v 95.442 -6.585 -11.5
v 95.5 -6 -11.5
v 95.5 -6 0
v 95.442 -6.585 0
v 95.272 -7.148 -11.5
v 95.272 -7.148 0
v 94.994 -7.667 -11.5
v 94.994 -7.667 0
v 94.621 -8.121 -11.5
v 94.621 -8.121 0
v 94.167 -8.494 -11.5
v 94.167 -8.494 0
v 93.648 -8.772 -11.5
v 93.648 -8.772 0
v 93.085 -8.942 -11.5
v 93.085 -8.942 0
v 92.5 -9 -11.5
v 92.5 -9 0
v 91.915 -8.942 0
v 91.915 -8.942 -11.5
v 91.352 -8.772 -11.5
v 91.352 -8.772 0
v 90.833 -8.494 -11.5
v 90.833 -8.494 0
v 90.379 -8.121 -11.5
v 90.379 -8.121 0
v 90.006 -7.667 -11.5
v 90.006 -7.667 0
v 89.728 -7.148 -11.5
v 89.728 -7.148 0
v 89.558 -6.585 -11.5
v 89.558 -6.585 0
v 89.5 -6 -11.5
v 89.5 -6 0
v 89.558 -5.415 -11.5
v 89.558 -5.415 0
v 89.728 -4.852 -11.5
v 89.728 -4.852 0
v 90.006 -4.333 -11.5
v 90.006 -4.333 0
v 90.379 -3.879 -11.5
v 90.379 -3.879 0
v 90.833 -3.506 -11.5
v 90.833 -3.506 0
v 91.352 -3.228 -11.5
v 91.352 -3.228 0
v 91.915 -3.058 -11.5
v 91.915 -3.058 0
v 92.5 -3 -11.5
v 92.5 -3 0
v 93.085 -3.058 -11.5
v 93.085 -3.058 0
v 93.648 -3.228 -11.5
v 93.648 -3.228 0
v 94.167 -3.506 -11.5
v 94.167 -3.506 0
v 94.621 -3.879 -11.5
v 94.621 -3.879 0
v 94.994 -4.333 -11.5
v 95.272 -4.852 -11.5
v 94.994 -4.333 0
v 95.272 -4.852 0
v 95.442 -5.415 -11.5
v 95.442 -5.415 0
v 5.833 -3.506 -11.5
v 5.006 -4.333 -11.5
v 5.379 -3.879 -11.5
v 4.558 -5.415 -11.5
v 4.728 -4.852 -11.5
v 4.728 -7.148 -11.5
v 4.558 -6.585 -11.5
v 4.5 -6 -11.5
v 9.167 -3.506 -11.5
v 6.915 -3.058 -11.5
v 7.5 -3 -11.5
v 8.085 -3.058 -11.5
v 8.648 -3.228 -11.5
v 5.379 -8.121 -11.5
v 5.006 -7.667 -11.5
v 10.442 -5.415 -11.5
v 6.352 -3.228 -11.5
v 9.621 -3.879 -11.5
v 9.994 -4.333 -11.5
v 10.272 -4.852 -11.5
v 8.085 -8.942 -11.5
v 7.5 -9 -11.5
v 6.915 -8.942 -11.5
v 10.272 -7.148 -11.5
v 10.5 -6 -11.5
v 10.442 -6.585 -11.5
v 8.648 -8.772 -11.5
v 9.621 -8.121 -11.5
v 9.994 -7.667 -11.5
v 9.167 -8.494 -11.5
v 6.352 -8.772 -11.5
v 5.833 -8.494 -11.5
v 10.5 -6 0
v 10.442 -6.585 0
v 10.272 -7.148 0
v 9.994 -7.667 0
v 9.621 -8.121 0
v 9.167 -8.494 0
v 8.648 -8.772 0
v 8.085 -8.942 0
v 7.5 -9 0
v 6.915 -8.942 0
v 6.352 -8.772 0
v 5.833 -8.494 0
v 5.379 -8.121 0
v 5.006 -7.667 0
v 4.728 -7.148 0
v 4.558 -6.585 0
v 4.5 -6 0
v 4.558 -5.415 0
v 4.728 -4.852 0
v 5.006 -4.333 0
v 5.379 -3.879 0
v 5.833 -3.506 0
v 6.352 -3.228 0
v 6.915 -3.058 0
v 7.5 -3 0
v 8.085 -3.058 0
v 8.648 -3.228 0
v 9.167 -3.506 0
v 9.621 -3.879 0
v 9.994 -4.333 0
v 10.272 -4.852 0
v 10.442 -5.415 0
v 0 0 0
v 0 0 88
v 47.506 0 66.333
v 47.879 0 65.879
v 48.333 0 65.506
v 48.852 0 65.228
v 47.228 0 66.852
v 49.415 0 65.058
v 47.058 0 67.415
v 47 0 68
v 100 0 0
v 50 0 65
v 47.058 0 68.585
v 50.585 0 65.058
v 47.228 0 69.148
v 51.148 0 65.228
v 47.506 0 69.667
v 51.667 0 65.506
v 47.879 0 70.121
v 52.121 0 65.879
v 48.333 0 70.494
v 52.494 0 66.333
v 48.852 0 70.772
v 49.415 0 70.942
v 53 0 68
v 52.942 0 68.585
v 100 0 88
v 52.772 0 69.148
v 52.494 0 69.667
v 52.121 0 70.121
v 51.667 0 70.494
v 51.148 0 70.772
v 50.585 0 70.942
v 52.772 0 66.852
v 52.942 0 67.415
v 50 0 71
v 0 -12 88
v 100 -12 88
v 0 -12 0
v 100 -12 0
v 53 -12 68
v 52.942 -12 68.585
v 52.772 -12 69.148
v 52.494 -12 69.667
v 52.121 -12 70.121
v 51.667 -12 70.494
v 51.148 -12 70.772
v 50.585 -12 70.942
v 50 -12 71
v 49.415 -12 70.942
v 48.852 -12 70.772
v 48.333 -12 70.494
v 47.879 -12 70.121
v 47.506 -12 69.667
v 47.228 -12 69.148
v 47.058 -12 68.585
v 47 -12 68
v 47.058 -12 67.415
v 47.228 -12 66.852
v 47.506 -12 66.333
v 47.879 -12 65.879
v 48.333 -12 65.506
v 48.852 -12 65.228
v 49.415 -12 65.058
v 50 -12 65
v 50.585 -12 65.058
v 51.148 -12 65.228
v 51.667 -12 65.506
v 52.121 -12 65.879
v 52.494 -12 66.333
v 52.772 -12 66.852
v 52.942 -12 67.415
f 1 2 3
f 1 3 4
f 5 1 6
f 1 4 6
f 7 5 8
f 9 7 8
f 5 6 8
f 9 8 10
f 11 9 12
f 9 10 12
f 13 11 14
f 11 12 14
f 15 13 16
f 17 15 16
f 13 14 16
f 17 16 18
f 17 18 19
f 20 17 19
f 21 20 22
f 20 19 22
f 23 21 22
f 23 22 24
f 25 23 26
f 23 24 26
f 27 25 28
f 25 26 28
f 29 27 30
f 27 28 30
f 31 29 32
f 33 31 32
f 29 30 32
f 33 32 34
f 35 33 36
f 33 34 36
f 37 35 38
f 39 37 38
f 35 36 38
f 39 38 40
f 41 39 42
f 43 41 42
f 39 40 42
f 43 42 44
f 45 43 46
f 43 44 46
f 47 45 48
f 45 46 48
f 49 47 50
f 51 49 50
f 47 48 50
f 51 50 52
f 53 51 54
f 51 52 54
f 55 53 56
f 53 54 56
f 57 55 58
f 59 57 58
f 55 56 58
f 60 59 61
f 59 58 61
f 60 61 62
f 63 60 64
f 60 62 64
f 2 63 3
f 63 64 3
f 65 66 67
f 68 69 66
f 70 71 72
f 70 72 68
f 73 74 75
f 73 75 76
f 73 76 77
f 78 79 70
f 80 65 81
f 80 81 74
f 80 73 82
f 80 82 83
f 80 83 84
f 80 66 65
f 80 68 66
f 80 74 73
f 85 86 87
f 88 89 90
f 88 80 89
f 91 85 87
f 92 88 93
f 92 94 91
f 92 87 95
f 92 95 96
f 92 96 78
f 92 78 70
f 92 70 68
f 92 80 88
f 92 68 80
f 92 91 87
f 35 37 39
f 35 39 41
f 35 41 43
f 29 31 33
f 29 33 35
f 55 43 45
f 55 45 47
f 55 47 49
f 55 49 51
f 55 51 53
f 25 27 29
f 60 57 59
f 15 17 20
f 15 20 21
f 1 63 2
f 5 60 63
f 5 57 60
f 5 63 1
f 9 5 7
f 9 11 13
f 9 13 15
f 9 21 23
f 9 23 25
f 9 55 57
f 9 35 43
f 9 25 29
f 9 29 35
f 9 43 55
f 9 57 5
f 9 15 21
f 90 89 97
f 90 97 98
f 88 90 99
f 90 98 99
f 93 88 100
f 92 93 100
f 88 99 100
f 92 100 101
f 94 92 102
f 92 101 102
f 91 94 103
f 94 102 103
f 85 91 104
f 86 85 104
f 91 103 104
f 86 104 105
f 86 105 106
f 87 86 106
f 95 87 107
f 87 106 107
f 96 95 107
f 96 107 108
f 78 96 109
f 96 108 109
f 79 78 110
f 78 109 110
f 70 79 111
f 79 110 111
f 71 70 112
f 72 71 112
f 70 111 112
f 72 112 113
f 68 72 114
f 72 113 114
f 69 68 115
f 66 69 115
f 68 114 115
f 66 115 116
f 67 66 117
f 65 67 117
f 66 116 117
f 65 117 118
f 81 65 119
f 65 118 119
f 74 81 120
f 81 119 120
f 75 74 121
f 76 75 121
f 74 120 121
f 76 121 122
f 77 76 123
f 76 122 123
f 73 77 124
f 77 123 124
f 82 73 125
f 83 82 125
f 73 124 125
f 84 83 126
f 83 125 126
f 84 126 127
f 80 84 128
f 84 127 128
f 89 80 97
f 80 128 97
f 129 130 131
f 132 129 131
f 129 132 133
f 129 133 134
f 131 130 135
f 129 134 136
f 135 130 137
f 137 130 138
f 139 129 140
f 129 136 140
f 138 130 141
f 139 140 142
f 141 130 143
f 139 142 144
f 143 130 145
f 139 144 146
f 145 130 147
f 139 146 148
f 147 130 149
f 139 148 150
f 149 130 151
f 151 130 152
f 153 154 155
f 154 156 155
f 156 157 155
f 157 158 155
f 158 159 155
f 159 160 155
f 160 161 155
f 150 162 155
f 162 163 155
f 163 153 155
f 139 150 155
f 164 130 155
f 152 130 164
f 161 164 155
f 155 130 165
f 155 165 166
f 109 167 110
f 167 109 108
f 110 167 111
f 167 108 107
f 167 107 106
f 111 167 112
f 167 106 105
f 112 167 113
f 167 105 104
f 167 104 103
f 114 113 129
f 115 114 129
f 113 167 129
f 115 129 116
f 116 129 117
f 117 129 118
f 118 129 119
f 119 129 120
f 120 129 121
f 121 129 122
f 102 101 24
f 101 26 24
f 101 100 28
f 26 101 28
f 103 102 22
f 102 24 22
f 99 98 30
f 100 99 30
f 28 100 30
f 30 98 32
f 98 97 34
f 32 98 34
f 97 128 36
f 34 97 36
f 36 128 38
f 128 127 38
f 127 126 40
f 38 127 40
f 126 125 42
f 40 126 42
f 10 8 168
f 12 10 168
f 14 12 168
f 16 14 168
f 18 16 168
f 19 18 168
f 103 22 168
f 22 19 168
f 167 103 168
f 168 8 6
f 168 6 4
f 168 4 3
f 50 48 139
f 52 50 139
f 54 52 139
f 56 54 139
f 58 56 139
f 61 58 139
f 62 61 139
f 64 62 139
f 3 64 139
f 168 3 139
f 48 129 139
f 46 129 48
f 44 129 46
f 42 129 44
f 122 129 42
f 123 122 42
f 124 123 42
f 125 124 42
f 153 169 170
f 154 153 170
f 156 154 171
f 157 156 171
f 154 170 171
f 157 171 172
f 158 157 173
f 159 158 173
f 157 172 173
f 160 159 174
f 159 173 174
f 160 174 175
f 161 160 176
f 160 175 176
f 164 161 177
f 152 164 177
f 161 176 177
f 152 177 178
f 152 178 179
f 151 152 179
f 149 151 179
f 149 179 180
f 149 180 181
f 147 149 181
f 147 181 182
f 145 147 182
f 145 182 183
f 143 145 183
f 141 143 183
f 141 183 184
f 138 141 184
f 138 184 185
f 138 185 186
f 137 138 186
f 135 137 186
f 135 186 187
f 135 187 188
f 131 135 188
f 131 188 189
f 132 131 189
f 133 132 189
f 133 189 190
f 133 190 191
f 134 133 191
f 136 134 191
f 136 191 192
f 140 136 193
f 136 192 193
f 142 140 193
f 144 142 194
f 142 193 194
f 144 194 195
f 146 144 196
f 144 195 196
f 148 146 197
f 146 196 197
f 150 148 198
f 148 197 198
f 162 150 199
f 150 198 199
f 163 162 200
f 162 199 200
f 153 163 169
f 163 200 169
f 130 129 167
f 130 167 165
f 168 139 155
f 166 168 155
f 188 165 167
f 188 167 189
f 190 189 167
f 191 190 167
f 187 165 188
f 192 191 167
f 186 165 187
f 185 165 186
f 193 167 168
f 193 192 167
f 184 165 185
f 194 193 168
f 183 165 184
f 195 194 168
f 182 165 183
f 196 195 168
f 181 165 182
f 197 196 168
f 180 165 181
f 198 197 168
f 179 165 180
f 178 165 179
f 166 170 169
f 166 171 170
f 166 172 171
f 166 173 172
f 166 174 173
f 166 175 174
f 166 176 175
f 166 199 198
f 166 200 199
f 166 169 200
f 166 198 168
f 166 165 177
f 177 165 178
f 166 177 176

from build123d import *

# Parameters (mm, degrees)
F0_W     = 100
F0_H     = 88
F1_DEPTH = 12
F2_R     = 3
F3_DEPTH = 11.5
F4_R     = 3
F5_DEPTH = 12.001


with BuildPart() as f1:
    # F0 (on Front) → F1 (new body)
    with BuildSketch(Plane.XZ):
        with Locations((50, 44)):
            Rectangle(F0_W, F0_H)
    extrude(amount=F1_DEPTH)

    # F2 (on face) → F3 (join)
    with BuildSketch(Plane(origin=(0, 0, 0), x_dir=(1, 0, 0), z_dir=(0, 0, -1))):
        with Locations((7.5, 6)):
            Circle(F2_R)
        with Locations((92.5, 6)):
            Circle(F2_R)
    extrude(amount=F3_DEPTH)

    # F4 (on face) → F5 (cut, through all)
    with BuildSketch(Plane.XZ.offset(12)):
        with Locations((50, 68)):
            Circle(F4_R)
    extrude(amount=-F5_DEPTH, mode=Mode.SUBTRACT)


solid = f1.part
